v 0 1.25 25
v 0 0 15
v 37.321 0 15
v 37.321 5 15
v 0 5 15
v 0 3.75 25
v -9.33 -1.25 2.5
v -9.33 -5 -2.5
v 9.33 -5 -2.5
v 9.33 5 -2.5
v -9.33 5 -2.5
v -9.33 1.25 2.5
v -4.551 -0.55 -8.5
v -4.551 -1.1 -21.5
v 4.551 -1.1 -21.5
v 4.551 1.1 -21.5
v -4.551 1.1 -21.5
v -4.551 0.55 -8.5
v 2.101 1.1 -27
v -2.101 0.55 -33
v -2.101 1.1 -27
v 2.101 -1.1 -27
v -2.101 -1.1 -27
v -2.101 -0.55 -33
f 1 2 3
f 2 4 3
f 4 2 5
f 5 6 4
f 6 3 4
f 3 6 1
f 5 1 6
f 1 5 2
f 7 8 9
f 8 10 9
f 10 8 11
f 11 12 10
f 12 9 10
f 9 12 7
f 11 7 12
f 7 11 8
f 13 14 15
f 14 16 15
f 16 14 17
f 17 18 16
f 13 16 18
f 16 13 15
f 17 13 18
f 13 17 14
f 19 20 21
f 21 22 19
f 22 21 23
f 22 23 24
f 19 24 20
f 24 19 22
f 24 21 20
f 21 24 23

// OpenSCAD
//Copyright Austin Floyd 2013
//http://www.thingiverse.com/thing:119050
//license GNU GPL
//austin.floyd at 3DprintGeeks (dot) com

//global variables.. if not set when calling wedge it will use these values. 
//The prefix st_ is to "namespace" the global variables so they're not accidentally overridden elsewhere


//The top angle of the right triangle
st_wedgeAngle=12; // [0.01:89.99]

//The height of the triangle (width auto-generated based on this)
st_wedgeHeight=27; // [0.01:200]

//Depth (thickness) of triangle
st_wedgeWidth=2.2; // [0.01:200]

//Increased or decreased percentage (50% would be 0.5) of top point vs bottom point
st_topFactor=0.5; // [0,0.1,0.2,0.3,0.4,0.5,0.6,0.7,0.8,0.9,1]

//Whether or not to center on x/y/z
st_center=false; // [true, false]

//Flip it upside down
st_invert=false; // [true, false]

//default wedge
//wedge();

//demo of several different wedges
demo();

module demo() {
	translate([0,0,15])
	wedge(angle=75,height=10, wedgeWidth=5);

	wedge(angle=75,height=5,topFactor=.25, center=true, wedgeWidth=10);

	translate([0,0,-15])
	wedge(angle=35,height=13,center=true);

	translate([0,0,-30])
	wedge(angle=35,height=6, center=true, invert=true);
}


module wedge(angle=st_wedgeAngle, height=st_wedgeHeight, wedgeWidth=st_wedgeWidth, topFactor=st_topFactor, center=st_center, invert=st_invert) {
	angle2=180-90-angle;
	hyp=height/sin(angle2);
	width=sqrt(pow(hyp,2)-pow(height,2));
	if (!invert) {
		triangle(height, width, center, topFactor, wedgeWidth);
	}
	if (invert) {
		rotate(180,[1,0,0])
		triangle(height, width, center, topFactor, wedgeWidth);
	}
}
module triangle(height=5, width=5, center=false, topFactor=0.5, wedgeWidth) {
	triangles=[[0,1,4],[5,4,1],		// top
					[1,2,5],[2,3,4],		// sides
					[3,0,4], [4,5,2],	//back
           	[2,1,0], [2,0,3]]; // base
	halfWidth=width/2;
	halfWWidth=wedgeWidth/2;
	topWidth=wedgeWidth*topFactor;
	halfTopWidth=topWidth/2;
	topHalfDiff=(wedgeWidth-topWidth)/2;
	halfHeight=height/2;
	if (center) {
		polyhedron(
  			points=[/*0*/[halfWidth,halfWWidth,-halfHeight],/*1*/[halfWidth,-halfWWidth,-halfHeight],				//front point
					  /*2*/[-halfWidth,-halfWWidth,-halfHeight],       /*3*/[-halfWidth,halfWWidth,-halfHeight], //rear point
           	  /*4*/[-halfWidth,halfTopWidth,height-halfHeight], /*5*/[-halfWidth,-halfTopWidth,height-halfHeight] ], //front/rear top 
  			triangles=triangles
		);
	}
	else {
		polyhedron(
  			points=[/*0*/[width,wedgeWidth,0],         			 /*1*/[width,0,0],				    ////front point
					  /*2*/[0,0,0],       					  			 /*3*/[0,wedgeWidth,0], 		    //rear point
           	  /*4*/[0,wedgeWidth-topHalfDiff,height],/*5*/[0,topHalfDiff,height] ],//front/back top 
  			triangles=triangles
		);
	}
}
